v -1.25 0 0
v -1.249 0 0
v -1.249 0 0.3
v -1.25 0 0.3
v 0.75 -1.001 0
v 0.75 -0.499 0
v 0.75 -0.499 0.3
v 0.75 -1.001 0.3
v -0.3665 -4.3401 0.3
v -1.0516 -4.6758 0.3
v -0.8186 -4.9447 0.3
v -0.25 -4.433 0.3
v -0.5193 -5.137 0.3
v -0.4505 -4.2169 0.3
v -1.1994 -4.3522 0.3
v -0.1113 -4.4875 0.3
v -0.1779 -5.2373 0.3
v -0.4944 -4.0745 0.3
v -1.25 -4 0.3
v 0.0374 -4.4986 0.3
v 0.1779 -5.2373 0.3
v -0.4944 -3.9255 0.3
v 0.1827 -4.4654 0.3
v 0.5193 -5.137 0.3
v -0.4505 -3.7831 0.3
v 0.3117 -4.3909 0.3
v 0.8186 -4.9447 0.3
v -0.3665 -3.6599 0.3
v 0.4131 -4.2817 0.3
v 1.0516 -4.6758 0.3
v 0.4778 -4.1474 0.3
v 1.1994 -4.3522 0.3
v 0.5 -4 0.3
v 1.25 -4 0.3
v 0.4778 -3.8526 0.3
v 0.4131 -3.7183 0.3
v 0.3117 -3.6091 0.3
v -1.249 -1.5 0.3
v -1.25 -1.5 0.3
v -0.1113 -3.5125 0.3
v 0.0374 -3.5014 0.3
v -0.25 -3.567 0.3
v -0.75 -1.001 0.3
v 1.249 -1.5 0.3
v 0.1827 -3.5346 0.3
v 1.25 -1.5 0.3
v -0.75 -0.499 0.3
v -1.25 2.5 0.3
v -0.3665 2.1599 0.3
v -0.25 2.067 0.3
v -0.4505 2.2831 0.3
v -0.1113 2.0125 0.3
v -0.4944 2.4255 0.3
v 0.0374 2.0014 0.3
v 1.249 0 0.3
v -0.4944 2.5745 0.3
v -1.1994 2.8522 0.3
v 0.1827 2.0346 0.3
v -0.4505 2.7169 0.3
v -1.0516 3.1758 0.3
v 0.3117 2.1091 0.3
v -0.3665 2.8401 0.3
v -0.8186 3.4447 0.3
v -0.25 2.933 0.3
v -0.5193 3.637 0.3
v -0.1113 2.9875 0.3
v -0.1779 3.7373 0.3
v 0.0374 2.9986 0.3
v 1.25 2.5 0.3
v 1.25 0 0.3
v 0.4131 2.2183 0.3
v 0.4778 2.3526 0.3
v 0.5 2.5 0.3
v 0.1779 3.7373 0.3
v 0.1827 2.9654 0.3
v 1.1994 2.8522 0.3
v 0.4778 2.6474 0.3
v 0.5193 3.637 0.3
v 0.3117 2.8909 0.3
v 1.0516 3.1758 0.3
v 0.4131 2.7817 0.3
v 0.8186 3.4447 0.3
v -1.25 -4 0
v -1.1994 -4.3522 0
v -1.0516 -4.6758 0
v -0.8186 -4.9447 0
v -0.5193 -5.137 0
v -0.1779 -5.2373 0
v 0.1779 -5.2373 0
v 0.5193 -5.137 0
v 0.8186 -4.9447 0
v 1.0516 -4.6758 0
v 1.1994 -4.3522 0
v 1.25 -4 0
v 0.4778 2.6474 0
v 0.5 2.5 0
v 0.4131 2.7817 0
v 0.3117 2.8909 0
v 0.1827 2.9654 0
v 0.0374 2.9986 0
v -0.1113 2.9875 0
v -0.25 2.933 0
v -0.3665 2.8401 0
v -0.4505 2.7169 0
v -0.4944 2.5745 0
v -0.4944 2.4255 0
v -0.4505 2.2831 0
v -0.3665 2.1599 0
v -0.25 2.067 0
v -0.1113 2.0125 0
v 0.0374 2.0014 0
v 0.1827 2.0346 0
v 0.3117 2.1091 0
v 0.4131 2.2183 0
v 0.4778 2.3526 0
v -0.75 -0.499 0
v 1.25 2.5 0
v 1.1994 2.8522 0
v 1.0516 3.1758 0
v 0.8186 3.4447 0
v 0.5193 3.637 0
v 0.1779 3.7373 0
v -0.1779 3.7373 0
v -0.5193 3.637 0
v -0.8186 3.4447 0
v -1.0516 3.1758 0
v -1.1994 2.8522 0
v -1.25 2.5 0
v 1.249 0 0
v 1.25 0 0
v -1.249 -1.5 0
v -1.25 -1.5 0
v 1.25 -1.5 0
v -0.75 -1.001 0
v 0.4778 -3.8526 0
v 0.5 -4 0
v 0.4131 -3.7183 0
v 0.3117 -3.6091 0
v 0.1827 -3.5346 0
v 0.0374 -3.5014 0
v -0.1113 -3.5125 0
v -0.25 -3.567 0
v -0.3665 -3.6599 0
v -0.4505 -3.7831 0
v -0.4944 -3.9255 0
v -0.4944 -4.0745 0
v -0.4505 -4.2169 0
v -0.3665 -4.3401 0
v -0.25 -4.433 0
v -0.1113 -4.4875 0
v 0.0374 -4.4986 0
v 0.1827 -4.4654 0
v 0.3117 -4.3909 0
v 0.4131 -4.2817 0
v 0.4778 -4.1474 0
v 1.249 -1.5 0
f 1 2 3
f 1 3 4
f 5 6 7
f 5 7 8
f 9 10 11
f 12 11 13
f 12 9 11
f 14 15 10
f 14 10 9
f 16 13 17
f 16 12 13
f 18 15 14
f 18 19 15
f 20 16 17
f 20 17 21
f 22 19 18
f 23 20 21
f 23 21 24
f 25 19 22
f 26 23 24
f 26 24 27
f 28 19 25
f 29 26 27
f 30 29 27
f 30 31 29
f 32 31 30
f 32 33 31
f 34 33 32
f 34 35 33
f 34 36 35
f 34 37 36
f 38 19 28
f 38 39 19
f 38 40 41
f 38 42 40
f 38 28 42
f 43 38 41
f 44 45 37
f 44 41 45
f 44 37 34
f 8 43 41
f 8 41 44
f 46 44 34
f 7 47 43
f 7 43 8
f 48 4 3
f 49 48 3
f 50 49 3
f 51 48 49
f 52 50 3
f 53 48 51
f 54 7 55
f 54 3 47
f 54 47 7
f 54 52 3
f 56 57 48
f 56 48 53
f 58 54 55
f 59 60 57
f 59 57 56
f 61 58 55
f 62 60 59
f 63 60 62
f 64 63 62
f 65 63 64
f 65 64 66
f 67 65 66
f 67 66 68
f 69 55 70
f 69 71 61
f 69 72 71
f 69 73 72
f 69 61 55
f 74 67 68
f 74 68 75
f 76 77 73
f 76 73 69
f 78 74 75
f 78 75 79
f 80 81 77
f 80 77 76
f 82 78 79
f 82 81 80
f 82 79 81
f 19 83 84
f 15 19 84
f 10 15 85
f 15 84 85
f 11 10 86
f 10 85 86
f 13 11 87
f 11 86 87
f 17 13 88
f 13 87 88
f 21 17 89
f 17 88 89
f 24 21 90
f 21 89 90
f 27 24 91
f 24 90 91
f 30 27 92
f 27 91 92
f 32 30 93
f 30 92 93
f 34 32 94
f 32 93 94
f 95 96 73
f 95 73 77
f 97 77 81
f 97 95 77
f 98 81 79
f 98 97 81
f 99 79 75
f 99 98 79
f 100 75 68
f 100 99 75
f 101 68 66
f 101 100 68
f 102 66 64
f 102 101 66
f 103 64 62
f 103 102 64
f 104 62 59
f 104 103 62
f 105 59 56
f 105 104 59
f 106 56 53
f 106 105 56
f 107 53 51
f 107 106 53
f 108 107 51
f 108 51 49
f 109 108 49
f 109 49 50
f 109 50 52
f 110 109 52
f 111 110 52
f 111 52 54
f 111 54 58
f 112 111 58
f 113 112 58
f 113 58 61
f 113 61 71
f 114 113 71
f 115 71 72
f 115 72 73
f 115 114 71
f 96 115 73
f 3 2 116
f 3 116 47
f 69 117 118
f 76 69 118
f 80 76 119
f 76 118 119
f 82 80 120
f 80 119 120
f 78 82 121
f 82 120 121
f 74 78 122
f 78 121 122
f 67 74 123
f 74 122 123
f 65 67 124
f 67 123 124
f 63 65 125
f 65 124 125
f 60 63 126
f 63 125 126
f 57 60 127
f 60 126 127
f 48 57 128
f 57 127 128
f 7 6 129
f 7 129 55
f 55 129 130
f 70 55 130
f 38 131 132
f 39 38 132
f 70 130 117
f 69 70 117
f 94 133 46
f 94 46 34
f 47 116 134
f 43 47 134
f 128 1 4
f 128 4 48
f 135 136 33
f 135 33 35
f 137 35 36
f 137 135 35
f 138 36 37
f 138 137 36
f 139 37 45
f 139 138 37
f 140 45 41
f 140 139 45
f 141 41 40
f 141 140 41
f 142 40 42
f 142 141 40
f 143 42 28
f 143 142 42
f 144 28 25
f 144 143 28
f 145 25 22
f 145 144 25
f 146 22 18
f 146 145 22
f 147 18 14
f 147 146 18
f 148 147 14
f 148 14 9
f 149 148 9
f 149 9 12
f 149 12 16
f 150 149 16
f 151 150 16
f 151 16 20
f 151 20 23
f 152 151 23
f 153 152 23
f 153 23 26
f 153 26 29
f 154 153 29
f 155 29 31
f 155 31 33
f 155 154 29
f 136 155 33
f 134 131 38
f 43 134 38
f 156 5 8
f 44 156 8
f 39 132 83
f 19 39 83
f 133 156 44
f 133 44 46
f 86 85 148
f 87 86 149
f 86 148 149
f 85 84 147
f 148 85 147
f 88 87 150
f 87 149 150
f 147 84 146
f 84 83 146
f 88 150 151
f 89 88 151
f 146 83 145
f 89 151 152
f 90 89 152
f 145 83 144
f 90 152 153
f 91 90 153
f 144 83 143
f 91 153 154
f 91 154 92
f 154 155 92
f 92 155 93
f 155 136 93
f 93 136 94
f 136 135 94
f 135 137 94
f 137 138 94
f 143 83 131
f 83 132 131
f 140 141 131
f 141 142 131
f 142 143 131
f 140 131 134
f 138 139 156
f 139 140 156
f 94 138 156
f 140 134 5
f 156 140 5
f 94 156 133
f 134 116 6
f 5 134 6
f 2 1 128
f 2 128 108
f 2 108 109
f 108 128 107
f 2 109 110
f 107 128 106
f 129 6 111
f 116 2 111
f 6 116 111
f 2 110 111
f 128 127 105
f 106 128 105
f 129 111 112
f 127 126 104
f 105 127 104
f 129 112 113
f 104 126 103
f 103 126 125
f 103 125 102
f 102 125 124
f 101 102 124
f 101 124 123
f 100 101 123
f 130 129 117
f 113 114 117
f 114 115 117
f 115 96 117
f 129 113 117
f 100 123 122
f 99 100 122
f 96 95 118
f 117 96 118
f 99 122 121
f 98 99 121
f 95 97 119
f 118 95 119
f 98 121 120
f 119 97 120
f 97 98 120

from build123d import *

# Parameters (mm, degrees)
SKETCH_R     = 0.5
PAD_DEPTH    = 0.3
CHAMFER_SIZE = 0.499


with BuildPart() as part:
    # Sketch → Pad (new body)
    with BuildSketch(Plane.XY):
        with BuildLine():
            Line((-0.75, 0), (-0.75, -1.5))
            Line((-0.75, -1.5), (-1.25, -1.5))
            Line((-1.25, -1.5), (-1.25, -4))
            ThreePointArc((-1.25, -4), (0, -5.25), (1.25, -4))
            Line((1.25, -1.5), (1.25, -4))
            Line((0.75, -1.5), (1.25, -1.5))
            Line((0.75, 0), (0.75, -1.5))
            Line((0.75, 0), (1.25, 0))
            Line((1.25, 0), (1.25, 2.5))
            ThreePointArc((1.25, 2.5), (0, 3.75), (-1.25, 2.5))
            Line((-1.25, 0), (-1.25, 2.5))
            Line((-0.75, 0), (-1.25, 0))
        make_face()
        with Locations((0, -4)):
            Circle(SKETCH_R, mode=Mode.SUBTRACT)
        with Locations((0, 2.5)):
            Circle(SKETCH_R, mode=Mode.SUBTRACT)
    extrude(amount=PAD_DEPTH)

    # Chamfer
    chamfer_edges = [part.edges().sort_by_distance(p)[0] for p in [
        (-0.75, 0, 0.15),
        (-0.75, -1.5, 0.15),
        (0.75, 0, 0.15),
        (0.75, -1.5, 0.15),
    ]]
    chamfer(chamfer_edges, length=CHAMFER_SIZE)


solid = part.part
